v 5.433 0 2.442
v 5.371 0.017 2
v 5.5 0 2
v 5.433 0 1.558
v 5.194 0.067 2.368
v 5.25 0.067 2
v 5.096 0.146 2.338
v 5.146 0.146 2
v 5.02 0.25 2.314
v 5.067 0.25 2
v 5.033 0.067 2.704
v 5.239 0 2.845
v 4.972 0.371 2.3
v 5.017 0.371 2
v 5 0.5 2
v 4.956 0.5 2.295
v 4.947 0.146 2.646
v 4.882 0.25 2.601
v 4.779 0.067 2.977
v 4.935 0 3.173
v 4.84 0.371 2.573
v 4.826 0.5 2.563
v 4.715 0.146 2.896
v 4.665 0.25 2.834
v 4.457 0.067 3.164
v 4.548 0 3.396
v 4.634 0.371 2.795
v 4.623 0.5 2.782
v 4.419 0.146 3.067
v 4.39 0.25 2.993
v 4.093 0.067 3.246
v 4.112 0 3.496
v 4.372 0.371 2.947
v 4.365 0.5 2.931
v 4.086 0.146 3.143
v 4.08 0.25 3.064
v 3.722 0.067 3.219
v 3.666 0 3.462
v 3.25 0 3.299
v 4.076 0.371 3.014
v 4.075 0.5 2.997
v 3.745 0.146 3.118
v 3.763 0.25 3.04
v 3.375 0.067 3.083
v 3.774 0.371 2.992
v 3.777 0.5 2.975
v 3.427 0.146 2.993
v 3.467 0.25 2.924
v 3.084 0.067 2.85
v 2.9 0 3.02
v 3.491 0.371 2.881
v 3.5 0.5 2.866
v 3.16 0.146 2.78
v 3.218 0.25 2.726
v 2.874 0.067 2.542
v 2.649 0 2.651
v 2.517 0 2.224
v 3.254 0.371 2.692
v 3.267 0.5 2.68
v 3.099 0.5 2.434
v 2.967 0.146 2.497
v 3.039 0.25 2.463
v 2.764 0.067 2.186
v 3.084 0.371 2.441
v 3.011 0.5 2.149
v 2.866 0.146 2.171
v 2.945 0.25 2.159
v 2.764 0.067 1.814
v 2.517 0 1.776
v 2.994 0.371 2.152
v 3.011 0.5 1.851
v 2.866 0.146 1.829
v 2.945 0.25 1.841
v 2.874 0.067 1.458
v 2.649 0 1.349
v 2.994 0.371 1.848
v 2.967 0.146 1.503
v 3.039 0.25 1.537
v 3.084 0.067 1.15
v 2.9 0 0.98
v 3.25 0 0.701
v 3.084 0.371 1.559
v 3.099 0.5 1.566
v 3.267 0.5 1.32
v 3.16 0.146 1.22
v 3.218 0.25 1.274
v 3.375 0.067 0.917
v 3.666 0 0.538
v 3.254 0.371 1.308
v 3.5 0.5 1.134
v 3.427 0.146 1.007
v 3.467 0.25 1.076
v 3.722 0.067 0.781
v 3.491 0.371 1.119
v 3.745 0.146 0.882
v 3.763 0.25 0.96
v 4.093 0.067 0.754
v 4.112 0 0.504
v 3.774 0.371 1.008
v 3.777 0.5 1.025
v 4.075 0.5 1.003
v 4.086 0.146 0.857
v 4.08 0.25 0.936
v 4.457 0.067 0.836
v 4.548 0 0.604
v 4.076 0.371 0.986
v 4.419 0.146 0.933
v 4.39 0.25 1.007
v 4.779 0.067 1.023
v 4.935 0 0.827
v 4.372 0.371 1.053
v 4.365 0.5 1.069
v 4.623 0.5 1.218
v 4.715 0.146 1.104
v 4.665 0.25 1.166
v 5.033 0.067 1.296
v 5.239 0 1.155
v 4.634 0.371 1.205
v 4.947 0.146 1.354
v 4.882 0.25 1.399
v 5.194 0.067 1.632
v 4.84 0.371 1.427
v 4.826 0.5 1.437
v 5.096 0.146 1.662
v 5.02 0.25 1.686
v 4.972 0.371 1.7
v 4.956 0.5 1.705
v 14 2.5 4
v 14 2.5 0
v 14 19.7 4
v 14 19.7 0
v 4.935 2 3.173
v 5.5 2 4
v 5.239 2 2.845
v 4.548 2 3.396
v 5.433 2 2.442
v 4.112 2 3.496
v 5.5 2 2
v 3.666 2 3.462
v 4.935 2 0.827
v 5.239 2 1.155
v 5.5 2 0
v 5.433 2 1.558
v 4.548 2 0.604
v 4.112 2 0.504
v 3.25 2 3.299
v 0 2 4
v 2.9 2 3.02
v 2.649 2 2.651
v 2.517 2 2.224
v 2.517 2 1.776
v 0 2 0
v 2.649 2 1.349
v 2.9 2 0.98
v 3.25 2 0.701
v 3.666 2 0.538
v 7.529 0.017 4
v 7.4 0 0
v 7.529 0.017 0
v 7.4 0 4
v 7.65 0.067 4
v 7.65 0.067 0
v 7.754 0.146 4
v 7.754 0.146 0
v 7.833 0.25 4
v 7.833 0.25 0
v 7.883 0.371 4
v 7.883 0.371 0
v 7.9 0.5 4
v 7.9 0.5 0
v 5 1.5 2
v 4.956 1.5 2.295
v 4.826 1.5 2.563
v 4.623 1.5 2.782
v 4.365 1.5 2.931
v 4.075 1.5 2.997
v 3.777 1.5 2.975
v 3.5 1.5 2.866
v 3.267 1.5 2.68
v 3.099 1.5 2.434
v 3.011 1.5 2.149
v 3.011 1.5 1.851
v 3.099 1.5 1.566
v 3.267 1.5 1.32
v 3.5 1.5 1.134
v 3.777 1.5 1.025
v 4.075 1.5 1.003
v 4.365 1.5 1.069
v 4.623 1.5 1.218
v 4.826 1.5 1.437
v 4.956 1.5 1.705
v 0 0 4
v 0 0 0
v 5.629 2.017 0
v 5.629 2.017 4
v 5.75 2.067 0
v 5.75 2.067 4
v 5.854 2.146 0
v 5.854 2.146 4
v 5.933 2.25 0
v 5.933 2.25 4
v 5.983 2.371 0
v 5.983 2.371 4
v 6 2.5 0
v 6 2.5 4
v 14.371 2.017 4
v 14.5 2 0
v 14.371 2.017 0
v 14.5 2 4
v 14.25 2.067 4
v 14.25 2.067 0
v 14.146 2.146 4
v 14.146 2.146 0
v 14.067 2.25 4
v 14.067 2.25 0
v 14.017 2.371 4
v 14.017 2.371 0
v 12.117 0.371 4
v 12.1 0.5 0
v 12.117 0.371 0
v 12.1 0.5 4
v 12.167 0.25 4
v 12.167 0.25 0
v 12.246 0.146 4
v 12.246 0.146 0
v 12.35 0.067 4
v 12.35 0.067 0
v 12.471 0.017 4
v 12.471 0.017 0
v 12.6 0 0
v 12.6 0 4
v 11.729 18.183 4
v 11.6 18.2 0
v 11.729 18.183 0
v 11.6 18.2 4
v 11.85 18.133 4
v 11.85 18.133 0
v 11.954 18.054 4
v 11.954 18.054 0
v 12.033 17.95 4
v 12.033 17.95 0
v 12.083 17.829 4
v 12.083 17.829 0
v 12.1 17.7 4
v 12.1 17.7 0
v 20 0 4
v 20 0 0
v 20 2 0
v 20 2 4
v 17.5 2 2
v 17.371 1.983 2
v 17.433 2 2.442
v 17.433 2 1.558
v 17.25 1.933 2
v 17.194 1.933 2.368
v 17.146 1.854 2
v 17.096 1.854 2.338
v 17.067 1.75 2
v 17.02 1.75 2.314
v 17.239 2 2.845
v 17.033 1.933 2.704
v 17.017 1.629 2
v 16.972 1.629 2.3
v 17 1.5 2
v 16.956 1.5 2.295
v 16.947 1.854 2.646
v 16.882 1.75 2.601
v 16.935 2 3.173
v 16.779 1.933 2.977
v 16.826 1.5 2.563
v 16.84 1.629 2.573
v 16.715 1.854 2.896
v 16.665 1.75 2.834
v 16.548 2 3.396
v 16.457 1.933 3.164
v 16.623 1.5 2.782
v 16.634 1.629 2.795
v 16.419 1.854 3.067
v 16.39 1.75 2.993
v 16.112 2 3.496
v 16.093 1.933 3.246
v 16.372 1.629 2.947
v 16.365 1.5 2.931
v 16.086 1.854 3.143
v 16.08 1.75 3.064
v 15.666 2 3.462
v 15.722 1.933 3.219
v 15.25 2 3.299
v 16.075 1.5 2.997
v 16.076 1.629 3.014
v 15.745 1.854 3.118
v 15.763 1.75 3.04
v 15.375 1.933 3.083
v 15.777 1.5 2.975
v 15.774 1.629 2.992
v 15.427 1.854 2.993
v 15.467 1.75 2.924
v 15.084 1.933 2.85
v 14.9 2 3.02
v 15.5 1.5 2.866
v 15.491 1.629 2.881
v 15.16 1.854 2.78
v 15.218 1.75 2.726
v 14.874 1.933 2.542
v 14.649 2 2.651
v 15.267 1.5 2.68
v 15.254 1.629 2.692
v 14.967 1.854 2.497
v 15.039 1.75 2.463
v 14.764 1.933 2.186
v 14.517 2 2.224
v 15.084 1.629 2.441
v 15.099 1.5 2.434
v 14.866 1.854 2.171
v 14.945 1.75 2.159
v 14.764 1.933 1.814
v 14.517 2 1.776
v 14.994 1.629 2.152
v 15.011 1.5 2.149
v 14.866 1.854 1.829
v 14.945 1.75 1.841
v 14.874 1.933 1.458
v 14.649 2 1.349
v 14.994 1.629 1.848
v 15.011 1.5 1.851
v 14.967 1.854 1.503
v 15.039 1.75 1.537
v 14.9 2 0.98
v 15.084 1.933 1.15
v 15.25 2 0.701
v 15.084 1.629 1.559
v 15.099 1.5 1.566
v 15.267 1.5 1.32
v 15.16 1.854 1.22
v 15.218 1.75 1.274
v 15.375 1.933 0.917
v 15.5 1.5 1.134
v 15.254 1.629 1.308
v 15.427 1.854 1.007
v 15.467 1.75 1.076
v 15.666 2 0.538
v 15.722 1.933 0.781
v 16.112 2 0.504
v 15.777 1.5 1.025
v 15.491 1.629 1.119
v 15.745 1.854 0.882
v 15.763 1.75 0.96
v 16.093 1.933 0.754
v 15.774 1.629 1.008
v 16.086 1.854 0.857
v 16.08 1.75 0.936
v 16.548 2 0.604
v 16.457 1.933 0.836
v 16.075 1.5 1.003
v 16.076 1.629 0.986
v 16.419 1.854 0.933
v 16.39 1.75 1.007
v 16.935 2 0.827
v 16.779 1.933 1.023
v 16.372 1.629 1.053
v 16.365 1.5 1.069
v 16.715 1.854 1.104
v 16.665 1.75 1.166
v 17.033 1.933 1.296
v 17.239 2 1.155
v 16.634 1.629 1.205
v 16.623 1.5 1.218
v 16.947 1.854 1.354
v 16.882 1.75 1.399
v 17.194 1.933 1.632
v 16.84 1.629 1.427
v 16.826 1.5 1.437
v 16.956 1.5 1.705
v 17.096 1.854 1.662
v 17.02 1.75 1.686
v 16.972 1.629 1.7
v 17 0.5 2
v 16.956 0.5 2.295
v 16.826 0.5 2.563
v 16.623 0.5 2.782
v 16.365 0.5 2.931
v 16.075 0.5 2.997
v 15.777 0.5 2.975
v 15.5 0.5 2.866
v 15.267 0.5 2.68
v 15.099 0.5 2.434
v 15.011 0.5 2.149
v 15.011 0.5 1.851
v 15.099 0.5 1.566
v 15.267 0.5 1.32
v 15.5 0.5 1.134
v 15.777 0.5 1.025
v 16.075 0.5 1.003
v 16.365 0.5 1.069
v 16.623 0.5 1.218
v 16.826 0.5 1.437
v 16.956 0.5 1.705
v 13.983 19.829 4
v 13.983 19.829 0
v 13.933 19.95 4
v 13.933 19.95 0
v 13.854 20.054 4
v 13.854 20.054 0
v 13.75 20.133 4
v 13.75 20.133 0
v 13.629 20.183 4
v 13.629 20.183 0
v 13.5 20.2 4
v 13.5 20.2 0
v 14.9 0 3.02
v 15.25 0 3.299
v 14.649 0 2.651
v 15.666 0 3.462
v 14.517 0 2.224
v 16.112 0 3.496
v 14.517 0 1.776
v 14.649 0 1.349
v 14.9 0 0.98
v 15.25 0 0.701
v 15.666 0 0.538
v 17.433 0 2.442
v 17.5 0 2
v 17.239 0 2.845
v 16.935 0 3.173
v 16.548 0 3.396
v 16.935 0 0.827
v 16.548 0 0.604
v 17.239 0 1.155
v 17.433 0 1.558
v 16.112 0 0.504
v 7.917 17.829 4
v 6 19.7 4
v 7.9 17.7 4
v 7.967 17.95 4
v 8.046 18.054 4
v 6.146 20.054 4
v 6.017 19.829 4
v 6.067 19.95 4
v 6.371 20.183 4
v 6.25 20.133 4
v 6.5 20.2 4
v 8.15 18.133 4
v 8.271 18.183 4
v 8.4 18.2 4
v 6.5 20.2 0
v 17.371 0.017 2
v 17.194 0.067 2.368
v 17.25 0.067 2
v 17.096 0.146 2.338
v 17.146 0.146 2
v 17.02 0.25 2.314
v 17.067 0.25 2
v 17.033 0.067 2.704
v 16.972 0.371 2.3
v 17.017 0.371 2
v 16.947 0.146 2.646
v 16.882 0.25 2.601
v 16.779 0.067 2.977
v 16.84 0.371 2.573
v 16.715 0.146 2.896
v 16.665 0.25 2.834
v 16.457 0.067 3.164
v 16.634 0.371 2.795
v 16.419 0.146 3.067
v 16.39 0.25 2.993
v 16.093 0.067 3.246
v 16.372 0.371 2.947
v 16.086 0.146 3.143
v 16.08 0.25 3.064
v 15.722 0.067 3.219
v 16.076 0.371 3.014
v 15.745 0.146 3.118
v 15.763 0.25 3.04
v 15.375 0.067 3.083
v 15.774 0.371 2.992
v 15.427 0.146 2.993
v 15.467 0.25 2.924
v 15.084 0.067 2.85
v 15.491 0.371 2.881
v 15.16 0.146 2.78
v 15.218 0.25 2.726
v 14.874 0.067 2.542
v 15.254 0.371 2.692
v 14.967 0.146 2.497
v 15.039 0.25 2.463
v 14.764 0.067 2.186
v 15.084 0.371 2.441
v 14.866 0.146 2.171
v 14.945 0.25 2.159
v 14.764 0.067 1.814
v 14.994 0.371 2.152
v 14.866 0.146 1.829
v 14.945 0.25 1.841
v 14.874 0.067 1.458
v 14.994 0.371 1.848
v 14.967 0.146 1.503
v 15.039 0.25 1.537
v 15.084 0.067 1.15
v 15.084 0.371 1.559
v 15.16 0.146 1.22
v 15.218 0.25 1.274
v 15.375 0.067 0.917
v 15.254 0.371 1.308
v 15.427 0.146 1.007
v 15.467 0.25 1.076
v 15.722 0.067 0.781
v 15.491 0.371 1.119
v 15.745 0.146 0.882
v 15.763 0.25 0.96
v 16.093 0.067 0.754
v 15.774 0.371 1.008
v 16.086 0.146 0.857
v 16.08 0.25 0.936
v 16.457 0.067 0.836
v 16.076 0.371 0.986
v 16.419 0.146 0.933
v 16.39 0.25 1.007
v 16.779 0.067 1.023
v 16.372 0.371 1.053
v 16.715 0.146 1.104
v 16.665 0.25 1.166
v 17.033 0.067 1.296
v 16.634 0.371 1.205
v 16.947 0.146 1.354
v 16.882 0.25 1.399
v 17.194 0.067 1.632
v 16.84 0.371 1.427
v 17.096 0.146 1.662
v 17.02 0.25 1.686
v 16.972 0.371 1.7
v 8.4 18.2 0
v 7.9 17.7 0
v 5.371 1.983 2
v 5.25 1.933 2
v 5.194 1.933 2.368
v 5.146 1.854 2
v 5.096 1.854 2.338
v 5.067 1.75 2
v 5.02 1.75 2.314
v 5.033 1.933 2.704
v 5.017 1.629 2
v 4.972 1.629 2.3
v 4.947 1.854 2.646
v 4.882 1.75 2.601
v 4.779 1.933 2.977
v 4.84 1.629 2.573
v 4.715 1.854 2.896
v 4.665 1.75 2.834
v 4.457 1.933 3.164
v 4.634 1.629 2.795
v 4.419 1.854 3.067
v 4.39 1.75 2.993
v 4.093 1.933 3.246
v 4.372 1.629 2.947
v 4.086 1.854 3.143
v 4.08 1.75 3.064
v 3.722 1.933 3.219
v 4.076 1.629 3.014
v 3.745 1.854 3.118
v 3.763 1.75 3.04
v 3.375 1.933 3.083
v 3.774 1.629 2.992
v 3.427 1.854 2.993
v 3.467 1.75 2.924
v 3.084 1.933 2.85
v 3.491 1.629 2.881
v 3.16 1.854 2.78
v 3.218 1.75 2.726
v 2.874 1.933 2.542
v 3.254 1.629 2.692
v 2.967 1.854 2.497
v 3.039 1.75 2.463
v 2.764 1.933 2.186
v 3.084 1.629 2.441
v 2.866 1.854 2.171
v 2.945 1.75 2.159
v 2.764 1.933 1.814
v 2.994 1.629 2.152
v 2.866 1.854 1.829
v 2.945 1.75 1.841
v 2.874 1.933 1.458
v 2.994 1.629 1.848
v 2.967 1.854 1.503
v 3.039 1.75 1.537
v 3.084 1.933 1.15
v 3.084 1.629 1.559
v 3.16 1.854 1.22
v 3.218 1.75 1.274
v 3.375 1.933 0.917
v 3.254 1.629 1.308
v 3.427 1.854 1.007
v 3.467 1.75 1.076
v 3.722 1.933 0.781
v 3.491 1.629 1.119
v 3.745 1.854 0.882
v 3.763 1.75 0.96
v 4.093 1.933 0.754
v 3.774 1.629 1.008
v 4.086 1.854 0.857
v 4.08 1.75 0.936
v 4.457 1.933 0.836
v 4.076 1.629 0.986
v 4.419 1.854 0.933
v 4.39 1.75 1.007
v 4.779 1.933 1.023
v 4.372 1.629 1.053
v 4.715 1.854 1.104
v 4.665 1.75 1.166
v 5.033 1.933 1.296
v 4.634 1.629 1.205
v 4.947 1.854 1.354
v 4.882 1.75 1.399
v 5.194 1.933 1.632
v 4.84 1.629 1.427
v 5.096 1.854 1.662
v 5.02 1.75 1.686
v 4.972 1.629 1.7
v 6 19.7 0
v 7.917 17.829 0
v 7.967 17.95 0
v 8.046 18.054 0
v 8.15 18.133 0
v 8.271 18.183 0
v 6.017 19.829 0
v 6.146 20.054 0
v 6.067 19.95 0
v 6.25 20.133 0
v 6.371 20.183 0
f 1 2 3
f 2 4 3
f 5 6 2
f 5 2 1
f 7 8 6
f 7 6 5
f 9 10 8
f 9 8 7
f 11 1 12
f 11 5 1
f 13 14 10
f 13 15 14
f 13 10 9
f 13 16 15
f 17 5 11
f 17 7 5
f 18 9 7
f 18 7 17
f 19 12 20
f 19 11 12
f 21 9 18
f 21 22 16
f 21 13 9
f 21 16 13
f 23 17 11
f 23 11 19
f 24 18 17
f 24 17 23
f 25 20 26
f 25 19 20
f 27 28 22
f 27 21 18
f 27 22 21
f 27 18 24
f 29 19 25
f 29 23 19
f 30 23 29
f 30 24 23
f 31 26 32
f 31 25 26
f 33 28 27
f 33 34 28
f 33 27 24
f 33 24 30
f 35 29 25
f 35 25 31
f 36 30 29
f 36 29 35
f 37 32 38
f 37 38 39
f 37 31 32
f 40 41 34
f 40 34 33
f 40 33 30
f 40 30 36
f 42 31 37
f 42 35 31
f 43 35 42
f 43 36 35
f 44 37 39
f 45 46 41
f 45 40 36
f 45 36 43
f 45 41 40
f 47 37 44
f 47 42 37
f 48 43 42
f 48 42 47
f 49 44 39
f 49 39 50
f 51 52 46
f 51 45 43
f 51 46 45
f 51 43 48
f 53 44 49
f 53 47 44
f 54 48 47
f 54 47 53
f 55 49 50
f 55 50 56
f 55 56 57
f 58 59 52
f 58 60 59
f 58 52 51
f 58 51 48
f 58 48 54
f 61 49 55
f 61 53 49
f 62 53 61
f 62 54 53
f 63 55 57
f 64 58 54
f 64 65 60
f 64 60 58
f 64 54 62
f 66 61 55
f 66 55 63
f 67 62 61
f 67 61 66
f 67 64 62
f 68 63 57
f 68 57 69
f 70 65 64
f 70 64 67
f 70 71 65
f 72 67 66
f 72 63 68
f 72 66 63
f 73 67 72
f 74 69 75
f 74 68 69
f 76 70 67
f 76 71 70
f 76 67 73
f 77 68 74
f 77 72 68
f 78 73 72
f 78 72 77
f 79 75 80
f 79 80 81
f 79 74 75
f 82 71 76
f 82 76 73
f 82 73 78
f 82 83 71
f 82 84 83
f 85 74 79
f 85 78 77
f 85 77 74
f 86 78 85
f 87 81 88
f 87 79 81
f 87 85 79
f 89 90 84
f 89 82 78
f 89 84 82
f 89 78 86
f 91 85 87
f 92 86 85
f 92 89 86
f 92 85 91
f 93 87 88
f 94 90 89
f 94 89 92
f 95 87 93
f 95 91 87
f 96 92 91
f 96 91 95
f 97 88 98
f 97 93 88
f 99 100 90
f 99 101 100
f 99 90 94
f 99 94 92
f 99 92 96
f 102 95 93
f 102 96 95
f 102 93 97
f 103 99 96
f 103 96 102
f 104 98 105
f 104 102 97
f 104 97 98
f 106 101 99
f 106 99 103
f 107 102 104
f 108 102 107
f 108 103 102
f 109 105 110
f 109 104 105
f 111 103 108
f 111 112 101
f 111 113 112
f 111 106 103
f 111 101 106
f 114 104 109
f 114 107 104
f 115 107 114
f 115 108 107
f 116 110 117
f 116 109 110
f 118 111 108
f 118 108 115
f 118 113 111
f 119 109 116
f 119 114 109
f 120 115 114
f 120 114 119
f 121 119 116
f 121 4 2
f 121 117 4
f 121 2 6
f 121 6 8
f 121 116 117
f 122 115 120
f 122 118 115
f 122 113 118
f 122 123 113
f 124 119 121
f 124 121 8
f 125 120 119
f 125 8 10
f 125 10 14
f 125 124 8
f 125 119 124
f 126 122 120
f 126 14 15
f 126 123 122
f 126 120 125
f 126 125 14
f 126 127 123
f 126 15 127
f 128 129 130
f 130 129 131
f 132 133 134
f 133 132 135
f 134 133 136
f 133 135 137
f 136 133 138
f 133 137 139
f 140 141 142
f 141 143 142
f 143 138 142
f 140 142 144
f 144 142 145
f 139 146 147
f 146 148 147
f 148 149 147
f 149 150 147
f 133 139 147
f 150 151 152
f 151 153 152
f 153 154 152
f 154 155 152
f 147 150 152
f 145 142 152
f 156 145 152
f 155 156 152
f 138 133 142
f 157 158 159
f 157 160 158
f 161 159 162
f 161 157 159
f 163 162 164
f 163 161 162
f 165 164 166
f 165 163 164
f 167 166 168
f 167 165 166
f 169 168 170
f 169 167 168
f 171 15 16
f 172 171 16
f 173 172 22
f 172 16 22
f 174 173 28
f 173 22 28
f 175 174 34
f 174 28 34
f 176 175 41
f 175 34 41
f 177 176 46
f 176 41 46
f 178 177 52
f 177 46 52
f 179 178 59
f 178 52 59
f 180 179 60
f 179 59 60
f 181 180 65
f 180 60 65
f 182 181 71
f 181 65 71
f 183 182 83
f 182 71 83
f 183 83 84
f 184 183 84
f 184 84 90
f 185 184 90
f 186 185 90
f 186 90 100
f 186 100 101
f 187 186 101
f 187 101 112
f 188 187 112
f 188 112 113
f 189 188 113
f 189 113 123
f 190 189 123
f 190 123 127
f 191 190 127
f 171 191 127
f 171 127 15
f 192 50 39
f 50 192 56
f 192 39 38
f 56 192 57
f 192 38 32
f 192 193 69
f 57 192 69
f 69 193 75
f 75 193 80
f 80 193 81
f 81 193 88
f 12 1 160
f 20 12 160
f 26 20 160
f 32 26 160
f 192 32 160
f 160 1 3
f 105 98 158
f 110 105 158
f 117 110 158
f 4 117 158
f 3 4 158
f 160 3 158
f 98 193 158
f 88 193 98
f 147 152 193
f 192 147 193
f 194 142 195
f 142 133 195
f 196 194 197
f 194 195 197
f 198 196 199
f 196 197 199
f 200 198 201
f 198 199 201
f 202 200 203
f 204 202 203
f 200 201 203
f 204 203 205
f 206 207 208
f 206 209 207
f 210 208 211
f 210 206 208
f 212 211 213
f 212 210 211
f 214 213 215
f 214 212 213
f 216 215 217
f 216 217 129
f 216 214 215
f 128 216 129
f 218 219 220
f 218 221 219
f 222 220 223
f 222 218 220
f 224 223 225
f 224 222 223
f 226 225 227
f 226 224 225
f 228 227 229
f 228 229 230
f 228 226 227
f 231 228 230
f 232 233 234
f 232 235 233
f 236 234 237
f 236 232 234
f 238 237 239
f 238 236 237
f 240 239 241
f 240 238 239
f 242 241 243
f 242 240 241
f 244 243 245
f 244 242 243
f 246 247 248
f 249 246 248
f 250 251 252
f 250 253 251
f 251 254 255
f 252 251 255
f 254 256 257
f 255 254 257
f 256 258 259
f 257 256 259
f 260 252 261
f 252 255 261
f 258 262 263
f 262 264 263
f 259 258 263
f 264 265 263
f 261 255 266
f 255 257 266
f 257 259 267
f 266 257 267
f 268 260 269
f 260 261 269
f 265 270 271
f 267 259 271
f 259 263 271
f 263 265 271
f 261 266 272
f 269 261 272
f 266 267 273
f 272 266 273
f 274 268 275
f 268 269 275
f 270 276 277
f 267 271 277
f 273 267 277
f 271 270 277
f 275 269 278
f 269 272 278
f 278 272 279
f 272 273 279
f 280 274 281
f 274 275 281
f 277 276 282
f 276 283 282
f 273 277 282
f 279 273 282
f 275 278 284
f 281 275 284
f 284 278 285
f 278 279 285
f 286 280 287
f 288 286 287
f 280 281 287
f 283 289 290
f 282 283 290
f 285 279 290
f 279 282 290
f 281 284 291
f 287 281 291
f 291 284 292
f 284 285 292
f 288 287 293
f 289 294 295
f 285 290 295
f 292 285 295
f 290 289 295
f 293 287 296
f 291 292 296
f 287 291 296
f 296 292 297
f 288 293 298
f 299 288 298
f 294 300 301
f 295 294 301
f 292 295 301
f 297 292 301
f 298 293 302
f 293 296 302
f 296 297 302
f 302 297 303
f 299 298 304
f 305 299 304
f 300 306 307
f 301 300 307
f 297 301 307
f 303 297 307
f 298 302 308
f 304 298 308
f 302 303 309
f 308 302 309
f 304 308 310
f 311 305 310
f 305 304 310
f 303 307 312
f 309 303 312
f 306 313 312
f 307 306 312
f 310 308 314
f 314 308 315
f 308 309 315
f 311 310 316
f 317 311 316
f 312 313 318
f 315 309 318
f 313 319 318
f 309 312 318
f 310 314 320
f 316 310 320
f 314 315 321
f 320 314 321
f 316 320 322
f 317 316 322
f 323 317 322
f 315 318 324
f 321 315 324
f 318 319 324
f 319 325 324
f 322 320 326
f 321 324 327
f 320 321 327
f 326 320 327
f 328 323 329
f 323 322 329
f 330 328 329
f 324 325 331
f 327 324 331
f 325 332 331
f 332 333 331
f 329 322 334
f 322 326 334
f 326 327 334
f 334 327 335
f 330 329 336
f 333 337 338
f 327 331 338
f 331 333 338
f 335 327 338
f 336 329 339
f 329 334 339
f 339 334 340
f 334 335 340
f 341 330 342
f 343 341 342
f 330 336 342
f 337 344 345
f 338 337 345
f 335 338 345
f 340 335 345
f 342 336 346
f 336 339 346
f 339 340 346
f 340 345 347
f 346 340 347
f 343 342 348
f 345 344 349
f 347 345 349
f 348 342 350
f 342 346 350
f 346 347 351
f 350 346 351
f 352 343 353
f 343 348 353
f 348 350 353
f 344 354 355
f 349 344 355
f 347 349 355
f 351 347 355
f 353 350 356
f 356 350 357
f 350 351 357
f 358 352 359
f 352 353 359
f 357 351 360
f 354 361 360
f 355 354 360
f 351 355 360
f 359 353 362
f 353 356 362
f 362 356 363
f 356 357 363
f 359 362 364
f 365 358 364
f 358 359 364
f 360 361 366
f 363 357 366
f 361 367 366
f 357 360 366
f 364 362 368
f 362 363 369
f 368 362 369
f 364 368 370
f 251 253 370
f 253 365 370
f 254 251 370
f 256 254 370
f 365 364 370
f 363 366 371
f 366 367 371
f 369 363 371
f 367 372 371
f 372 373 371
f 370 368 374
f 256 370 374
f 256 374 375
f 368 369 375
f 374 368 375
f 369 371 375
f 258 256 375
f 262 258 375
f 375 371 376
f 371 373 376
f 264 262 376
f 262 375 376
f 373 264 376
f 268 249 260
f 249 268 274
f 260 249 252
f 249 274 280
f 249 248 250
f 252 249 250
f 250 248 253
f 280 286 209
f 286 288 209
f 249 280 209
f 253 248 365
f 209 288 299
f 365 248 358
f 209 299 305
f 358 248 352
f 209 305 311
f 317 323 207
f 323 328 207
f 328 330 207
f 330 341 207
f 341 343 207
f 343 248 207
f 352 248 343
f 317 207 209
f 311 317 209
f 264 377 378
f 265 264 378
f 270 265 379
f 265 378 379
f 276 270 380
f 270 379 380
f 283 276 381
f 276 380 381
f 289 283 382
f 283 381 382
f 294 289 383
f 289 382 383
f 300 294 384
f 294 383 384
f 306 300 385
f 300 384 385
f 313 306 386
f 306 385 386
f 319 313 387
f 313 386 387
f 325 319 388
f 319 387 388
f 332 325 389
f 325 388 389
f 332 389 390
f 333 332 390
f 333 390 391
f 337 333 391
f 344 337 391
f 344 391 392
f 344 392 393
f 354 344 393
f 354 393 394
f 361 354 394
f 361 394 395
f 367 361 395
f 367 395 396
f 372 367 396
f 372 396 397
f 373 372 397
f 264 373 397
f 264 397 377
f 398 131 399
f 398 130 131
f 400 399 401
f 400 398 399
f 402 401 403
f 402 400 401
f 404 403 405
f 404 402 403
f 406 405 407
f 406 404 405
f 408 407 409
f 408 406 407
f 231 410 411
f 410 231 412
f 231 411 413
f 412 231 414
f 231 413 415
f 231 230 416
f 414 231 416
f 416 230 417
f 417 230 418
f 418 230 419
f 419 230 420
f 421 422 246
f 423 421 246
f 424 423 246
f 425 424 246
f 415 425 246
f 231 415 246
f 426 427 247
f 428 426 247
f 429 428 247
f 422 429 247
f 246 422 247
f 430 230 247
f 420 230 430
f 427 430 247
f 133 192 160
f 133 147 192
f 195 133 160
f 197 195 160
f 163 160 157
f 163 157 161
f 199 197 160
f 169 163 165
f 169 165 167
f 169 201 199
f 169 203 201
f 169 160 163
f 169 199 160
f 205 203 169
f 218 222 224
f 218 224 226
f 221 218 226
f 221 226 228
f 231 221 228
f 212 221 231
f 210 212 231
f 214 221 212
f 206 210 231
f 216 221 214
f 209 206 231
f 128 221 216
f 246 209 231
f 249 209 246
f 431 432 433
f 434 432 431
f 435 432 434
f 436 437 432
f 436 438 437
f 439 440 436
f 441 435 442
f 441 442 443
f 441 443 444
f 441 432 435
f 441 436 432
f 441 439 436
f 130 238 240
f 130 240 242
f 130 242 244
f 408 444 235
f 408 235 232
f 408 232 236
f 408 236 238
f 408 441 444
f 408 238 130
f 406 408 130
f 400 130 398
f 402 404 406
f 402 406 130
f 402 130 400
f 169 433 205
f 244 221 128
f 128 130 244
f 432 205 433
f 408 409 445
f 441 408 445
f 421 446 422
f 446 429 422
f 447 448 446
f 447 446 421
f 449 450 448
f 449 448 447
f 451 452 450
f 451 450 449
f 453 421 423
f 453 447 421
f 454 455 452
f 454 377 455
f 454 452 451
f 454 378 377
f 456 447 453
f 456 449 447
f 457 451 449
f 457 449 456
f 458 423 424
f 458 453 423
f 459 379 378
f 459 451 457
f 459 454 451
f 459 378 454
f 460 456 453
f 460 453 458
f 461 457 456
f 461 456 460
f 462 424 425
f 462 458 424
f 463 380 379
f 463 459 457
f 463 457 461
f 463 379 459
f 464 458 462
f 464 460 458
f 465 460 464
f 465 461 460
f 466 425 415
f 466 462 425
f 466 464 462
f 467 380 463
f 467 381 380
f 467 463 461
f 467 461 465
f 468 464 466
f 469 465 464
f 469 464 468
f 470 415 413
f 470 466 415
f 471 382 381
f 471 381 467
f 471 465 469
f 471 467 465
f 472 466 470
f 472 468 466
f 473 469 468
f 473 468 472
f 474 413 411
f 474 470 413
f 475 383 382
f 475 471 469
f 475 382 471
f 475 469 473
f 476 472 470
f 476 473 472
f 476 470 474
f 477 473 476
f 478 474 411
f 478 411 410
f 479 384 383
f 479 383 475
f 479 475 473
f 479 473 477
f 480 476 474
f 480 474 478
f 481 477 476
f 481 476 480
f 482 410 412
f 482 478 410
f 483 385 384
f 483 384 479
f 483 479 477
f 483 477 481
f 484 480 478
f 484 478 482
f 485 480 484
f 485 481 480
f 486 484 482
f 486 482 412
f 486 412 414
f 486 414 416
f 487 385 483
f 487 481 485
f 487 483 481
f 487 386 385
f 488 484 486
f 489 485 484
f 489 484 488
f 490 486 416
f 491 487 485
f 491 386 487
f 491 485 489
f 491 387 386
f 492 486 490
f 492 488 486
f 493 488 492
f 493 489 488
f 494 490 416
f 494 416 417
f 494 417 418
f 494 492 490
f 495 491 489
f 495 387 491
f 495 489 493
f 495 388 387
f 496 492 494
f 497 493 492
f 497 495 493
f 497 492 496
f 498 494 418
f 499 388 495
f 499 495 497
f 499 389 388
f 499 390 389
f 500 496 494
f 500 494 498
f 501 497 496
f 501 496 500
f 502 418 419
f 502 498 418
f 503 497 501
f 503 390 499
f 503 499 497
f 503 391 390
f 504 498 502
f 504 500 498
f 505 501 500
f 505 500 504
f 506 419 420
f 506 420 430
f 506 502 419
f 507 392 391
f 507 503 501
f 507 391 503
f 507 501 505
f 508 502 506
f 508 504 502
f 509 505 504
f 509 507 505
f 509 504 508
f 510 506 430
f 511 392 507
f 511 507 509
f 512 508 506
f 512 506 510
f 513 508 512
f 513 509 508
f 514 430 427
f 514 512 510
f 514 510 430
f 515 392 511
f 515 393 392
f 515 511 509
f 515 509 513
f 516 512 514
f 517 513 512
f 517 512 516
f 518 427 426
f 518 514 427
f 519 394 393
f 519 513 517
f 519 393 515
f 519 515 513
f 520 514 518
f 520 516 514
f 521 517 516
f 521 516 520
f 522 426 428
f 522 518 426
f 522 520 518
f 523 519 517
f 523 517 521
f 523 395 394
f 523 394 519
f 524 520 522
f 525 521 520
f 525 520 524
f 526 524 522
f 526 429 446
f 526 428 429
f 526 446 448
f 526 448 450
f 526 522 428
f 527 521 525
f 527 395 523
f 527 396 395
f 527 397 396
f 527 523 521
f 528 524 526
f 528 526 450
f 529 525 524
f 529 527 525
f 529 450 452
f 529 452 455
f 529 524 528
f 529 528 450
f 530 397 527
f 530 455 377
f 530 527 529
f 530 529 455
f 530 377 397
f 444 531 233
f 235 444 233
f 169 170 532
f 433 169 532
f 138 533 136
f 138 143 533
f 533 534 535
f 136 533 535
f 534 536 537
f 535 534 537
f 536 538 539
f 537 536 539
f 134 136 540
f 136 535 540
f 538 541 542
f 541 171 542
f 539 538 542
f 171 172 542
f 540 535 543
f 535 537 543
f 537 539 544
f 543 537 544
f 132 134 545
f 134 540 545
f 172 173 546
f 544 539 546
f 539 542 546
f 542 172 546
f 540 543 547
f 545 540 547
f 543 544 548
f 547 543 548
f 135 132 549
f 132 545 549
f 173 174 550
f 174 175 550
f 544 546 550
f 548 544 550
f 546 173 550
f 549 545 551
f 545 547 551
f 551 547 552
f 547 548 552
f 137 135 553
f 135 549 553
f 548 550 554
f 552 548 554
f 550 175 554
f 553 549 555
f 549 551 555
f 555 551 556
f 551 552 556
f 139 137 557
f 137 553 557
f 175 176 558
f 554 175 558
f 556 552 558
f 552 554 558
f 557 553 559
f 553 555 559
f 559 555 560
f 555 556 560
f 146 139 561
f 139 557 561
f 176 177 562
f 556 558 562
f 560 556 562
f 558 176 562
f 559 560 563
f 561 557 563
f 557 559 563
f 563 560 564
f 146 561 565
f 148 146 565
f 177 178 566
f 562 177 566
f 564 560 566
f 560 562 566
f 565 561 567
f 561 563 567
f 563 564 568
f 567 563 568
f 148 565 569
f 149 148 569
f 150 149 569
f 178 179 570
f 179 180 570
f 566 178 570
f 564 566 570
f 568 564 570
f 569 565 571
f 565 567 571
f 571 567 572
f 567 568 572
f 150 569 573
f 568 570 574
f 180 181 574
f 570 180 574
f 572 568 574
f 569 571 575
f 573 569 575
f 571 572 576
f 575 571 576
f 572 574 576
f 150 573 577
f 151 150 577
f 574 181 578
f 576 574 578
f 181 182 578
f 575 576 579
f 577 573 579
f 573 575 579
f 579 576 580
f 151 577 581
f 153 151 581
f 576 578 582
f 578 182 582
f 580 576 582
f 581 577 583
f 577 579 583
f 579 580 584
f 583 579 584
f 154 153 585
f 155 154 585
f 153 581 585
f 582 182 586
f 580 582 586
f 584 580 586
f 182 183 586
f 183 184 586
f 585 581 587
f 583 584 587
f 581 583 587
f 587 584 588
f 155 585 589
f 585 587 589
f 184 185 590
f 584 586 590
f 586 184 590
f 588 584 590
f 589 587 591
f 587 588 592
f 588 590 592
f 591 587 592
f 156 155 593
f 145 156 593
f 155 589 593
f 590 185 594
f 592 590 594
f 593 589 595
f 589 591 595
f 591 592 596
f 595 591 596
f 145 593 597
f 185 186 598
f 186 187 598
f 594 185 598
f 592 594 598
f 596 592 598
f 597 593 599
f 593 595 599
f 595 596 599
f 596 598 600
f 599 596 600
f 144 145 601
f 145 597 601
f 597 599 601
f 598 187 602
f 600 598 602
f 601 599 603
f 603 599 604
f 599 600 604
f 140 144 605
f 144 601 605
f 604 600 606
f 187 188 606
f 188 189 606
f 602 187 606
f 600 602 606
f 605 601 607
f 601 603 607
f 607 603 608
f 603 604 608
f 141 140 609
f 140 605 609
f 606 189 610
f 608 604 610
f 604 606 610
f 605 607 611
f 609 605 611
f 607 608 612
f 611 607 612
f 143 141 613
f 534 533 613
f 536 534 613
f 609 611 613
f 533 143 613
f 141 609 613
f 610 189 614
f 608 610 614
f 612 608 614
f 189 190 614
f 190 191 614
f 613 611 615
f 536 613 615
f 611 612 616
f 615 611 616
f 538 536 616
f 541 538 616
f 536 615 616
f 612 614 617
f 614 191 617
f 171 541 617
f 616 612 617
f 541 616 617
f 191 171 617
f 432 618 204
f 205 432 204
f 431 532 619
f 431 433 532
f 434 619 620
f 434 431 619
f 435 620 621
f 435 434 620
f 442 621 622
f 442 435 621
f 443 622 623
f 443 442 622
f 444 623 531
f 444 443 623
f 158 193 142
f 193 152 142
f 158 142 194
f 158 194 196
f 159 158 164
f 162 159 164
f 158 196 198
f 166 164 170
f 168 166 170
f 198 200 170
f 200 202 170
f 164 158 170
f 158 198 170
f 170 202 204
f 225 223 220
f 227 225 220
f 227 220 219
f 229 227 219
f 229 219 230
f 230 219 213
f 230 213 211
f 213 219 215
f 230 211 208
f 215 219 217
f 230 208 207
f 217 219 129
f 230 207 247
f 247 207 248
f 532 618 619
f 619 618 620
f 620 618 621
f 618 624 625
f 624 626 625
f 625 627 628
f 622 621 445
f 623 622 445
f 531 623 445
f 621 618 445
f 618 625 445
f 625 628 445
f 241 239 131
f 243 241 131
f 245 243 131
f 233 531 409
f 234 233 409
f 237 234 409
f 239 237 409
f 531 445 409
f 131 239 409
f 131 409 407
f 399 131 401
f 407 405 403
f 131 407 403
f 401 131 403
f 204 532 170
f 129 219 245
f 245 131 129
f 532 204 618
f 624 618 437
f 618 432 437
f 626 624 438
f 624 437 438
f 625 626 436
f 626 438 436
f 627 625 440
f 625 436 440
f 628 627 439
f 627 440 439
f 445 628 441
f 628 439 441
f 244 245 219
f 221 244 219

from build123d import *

# Parameters (mm, degrees)
F2_DEPTH = 4
F1_R     = 1
F3_DEPTH = 22.2
F5_R     = 0.49999


# Not quite as in the source:
# - a fillet or chamfer is up to 0.001 mm smaller than in the source, because OpenCascade refuses the exact size


with BuildPart() as f2:
    # F0 (on Top) → F2 (new body)
    with BuildSketch(Plane.XY):
        Polygon((0, 2), (0, 0), (7.9, 0), (7.9, 18.2000004202), (12.1, 18.2000004202), (12.1, 0), (20, 0), (20, 2), (14, 2), (14, 20.2), (6, 20.2), (6, 2), align=None)
    extrude(amount=F2_DEPTH)


with BuildPart() as f3:
    # F1 (on Front) → F3 (new body)
    with BuildSketch(Plane.XZ):
        with Locations((4, 2)):
            Circle(F1_R)
    extrude(amount=-F3_DEPTH)


with BuildPart() as f3b:
    # F1 (on Front) → F3, piece 2 (new body)
    with BuildSketch(Plane.XZ):
        with Locations((16, 2)):
            Circle(F1_R)
    extrude(amount=-F3_DEPTH)


with BuildPart() as f2_1:
    add(f2.part)

    # F4: cut F3, F3b
    add(f3.part, mode=Mode.SUBTRACT)
    add(f3b.part, mode=Mode.SUBTRACT)

    # F5 (radius 0.5 in the source; OpenCascade refuses exactly that, so slightly less here)
    f5_edges = [f2_1.edges().sort_by_distance(p)[0] for p in [
        (7.9, 0, 2),
        (12.1, 0, 2),
        (14, 20.2, 2),
        (7.9, 18.2, 2),
        (12.1, 18.2, 2),
        (6, 20.2, 2),
        (6, 2, 2),
        (14, 2, 2),
        (3, 2, 2),
        (15, 2, 2),
        (3, 0, 2),
        (15, 0, 2),
    ]]
    fillet(f5_edges, radius=F5_R)


solid = f2_1.part
